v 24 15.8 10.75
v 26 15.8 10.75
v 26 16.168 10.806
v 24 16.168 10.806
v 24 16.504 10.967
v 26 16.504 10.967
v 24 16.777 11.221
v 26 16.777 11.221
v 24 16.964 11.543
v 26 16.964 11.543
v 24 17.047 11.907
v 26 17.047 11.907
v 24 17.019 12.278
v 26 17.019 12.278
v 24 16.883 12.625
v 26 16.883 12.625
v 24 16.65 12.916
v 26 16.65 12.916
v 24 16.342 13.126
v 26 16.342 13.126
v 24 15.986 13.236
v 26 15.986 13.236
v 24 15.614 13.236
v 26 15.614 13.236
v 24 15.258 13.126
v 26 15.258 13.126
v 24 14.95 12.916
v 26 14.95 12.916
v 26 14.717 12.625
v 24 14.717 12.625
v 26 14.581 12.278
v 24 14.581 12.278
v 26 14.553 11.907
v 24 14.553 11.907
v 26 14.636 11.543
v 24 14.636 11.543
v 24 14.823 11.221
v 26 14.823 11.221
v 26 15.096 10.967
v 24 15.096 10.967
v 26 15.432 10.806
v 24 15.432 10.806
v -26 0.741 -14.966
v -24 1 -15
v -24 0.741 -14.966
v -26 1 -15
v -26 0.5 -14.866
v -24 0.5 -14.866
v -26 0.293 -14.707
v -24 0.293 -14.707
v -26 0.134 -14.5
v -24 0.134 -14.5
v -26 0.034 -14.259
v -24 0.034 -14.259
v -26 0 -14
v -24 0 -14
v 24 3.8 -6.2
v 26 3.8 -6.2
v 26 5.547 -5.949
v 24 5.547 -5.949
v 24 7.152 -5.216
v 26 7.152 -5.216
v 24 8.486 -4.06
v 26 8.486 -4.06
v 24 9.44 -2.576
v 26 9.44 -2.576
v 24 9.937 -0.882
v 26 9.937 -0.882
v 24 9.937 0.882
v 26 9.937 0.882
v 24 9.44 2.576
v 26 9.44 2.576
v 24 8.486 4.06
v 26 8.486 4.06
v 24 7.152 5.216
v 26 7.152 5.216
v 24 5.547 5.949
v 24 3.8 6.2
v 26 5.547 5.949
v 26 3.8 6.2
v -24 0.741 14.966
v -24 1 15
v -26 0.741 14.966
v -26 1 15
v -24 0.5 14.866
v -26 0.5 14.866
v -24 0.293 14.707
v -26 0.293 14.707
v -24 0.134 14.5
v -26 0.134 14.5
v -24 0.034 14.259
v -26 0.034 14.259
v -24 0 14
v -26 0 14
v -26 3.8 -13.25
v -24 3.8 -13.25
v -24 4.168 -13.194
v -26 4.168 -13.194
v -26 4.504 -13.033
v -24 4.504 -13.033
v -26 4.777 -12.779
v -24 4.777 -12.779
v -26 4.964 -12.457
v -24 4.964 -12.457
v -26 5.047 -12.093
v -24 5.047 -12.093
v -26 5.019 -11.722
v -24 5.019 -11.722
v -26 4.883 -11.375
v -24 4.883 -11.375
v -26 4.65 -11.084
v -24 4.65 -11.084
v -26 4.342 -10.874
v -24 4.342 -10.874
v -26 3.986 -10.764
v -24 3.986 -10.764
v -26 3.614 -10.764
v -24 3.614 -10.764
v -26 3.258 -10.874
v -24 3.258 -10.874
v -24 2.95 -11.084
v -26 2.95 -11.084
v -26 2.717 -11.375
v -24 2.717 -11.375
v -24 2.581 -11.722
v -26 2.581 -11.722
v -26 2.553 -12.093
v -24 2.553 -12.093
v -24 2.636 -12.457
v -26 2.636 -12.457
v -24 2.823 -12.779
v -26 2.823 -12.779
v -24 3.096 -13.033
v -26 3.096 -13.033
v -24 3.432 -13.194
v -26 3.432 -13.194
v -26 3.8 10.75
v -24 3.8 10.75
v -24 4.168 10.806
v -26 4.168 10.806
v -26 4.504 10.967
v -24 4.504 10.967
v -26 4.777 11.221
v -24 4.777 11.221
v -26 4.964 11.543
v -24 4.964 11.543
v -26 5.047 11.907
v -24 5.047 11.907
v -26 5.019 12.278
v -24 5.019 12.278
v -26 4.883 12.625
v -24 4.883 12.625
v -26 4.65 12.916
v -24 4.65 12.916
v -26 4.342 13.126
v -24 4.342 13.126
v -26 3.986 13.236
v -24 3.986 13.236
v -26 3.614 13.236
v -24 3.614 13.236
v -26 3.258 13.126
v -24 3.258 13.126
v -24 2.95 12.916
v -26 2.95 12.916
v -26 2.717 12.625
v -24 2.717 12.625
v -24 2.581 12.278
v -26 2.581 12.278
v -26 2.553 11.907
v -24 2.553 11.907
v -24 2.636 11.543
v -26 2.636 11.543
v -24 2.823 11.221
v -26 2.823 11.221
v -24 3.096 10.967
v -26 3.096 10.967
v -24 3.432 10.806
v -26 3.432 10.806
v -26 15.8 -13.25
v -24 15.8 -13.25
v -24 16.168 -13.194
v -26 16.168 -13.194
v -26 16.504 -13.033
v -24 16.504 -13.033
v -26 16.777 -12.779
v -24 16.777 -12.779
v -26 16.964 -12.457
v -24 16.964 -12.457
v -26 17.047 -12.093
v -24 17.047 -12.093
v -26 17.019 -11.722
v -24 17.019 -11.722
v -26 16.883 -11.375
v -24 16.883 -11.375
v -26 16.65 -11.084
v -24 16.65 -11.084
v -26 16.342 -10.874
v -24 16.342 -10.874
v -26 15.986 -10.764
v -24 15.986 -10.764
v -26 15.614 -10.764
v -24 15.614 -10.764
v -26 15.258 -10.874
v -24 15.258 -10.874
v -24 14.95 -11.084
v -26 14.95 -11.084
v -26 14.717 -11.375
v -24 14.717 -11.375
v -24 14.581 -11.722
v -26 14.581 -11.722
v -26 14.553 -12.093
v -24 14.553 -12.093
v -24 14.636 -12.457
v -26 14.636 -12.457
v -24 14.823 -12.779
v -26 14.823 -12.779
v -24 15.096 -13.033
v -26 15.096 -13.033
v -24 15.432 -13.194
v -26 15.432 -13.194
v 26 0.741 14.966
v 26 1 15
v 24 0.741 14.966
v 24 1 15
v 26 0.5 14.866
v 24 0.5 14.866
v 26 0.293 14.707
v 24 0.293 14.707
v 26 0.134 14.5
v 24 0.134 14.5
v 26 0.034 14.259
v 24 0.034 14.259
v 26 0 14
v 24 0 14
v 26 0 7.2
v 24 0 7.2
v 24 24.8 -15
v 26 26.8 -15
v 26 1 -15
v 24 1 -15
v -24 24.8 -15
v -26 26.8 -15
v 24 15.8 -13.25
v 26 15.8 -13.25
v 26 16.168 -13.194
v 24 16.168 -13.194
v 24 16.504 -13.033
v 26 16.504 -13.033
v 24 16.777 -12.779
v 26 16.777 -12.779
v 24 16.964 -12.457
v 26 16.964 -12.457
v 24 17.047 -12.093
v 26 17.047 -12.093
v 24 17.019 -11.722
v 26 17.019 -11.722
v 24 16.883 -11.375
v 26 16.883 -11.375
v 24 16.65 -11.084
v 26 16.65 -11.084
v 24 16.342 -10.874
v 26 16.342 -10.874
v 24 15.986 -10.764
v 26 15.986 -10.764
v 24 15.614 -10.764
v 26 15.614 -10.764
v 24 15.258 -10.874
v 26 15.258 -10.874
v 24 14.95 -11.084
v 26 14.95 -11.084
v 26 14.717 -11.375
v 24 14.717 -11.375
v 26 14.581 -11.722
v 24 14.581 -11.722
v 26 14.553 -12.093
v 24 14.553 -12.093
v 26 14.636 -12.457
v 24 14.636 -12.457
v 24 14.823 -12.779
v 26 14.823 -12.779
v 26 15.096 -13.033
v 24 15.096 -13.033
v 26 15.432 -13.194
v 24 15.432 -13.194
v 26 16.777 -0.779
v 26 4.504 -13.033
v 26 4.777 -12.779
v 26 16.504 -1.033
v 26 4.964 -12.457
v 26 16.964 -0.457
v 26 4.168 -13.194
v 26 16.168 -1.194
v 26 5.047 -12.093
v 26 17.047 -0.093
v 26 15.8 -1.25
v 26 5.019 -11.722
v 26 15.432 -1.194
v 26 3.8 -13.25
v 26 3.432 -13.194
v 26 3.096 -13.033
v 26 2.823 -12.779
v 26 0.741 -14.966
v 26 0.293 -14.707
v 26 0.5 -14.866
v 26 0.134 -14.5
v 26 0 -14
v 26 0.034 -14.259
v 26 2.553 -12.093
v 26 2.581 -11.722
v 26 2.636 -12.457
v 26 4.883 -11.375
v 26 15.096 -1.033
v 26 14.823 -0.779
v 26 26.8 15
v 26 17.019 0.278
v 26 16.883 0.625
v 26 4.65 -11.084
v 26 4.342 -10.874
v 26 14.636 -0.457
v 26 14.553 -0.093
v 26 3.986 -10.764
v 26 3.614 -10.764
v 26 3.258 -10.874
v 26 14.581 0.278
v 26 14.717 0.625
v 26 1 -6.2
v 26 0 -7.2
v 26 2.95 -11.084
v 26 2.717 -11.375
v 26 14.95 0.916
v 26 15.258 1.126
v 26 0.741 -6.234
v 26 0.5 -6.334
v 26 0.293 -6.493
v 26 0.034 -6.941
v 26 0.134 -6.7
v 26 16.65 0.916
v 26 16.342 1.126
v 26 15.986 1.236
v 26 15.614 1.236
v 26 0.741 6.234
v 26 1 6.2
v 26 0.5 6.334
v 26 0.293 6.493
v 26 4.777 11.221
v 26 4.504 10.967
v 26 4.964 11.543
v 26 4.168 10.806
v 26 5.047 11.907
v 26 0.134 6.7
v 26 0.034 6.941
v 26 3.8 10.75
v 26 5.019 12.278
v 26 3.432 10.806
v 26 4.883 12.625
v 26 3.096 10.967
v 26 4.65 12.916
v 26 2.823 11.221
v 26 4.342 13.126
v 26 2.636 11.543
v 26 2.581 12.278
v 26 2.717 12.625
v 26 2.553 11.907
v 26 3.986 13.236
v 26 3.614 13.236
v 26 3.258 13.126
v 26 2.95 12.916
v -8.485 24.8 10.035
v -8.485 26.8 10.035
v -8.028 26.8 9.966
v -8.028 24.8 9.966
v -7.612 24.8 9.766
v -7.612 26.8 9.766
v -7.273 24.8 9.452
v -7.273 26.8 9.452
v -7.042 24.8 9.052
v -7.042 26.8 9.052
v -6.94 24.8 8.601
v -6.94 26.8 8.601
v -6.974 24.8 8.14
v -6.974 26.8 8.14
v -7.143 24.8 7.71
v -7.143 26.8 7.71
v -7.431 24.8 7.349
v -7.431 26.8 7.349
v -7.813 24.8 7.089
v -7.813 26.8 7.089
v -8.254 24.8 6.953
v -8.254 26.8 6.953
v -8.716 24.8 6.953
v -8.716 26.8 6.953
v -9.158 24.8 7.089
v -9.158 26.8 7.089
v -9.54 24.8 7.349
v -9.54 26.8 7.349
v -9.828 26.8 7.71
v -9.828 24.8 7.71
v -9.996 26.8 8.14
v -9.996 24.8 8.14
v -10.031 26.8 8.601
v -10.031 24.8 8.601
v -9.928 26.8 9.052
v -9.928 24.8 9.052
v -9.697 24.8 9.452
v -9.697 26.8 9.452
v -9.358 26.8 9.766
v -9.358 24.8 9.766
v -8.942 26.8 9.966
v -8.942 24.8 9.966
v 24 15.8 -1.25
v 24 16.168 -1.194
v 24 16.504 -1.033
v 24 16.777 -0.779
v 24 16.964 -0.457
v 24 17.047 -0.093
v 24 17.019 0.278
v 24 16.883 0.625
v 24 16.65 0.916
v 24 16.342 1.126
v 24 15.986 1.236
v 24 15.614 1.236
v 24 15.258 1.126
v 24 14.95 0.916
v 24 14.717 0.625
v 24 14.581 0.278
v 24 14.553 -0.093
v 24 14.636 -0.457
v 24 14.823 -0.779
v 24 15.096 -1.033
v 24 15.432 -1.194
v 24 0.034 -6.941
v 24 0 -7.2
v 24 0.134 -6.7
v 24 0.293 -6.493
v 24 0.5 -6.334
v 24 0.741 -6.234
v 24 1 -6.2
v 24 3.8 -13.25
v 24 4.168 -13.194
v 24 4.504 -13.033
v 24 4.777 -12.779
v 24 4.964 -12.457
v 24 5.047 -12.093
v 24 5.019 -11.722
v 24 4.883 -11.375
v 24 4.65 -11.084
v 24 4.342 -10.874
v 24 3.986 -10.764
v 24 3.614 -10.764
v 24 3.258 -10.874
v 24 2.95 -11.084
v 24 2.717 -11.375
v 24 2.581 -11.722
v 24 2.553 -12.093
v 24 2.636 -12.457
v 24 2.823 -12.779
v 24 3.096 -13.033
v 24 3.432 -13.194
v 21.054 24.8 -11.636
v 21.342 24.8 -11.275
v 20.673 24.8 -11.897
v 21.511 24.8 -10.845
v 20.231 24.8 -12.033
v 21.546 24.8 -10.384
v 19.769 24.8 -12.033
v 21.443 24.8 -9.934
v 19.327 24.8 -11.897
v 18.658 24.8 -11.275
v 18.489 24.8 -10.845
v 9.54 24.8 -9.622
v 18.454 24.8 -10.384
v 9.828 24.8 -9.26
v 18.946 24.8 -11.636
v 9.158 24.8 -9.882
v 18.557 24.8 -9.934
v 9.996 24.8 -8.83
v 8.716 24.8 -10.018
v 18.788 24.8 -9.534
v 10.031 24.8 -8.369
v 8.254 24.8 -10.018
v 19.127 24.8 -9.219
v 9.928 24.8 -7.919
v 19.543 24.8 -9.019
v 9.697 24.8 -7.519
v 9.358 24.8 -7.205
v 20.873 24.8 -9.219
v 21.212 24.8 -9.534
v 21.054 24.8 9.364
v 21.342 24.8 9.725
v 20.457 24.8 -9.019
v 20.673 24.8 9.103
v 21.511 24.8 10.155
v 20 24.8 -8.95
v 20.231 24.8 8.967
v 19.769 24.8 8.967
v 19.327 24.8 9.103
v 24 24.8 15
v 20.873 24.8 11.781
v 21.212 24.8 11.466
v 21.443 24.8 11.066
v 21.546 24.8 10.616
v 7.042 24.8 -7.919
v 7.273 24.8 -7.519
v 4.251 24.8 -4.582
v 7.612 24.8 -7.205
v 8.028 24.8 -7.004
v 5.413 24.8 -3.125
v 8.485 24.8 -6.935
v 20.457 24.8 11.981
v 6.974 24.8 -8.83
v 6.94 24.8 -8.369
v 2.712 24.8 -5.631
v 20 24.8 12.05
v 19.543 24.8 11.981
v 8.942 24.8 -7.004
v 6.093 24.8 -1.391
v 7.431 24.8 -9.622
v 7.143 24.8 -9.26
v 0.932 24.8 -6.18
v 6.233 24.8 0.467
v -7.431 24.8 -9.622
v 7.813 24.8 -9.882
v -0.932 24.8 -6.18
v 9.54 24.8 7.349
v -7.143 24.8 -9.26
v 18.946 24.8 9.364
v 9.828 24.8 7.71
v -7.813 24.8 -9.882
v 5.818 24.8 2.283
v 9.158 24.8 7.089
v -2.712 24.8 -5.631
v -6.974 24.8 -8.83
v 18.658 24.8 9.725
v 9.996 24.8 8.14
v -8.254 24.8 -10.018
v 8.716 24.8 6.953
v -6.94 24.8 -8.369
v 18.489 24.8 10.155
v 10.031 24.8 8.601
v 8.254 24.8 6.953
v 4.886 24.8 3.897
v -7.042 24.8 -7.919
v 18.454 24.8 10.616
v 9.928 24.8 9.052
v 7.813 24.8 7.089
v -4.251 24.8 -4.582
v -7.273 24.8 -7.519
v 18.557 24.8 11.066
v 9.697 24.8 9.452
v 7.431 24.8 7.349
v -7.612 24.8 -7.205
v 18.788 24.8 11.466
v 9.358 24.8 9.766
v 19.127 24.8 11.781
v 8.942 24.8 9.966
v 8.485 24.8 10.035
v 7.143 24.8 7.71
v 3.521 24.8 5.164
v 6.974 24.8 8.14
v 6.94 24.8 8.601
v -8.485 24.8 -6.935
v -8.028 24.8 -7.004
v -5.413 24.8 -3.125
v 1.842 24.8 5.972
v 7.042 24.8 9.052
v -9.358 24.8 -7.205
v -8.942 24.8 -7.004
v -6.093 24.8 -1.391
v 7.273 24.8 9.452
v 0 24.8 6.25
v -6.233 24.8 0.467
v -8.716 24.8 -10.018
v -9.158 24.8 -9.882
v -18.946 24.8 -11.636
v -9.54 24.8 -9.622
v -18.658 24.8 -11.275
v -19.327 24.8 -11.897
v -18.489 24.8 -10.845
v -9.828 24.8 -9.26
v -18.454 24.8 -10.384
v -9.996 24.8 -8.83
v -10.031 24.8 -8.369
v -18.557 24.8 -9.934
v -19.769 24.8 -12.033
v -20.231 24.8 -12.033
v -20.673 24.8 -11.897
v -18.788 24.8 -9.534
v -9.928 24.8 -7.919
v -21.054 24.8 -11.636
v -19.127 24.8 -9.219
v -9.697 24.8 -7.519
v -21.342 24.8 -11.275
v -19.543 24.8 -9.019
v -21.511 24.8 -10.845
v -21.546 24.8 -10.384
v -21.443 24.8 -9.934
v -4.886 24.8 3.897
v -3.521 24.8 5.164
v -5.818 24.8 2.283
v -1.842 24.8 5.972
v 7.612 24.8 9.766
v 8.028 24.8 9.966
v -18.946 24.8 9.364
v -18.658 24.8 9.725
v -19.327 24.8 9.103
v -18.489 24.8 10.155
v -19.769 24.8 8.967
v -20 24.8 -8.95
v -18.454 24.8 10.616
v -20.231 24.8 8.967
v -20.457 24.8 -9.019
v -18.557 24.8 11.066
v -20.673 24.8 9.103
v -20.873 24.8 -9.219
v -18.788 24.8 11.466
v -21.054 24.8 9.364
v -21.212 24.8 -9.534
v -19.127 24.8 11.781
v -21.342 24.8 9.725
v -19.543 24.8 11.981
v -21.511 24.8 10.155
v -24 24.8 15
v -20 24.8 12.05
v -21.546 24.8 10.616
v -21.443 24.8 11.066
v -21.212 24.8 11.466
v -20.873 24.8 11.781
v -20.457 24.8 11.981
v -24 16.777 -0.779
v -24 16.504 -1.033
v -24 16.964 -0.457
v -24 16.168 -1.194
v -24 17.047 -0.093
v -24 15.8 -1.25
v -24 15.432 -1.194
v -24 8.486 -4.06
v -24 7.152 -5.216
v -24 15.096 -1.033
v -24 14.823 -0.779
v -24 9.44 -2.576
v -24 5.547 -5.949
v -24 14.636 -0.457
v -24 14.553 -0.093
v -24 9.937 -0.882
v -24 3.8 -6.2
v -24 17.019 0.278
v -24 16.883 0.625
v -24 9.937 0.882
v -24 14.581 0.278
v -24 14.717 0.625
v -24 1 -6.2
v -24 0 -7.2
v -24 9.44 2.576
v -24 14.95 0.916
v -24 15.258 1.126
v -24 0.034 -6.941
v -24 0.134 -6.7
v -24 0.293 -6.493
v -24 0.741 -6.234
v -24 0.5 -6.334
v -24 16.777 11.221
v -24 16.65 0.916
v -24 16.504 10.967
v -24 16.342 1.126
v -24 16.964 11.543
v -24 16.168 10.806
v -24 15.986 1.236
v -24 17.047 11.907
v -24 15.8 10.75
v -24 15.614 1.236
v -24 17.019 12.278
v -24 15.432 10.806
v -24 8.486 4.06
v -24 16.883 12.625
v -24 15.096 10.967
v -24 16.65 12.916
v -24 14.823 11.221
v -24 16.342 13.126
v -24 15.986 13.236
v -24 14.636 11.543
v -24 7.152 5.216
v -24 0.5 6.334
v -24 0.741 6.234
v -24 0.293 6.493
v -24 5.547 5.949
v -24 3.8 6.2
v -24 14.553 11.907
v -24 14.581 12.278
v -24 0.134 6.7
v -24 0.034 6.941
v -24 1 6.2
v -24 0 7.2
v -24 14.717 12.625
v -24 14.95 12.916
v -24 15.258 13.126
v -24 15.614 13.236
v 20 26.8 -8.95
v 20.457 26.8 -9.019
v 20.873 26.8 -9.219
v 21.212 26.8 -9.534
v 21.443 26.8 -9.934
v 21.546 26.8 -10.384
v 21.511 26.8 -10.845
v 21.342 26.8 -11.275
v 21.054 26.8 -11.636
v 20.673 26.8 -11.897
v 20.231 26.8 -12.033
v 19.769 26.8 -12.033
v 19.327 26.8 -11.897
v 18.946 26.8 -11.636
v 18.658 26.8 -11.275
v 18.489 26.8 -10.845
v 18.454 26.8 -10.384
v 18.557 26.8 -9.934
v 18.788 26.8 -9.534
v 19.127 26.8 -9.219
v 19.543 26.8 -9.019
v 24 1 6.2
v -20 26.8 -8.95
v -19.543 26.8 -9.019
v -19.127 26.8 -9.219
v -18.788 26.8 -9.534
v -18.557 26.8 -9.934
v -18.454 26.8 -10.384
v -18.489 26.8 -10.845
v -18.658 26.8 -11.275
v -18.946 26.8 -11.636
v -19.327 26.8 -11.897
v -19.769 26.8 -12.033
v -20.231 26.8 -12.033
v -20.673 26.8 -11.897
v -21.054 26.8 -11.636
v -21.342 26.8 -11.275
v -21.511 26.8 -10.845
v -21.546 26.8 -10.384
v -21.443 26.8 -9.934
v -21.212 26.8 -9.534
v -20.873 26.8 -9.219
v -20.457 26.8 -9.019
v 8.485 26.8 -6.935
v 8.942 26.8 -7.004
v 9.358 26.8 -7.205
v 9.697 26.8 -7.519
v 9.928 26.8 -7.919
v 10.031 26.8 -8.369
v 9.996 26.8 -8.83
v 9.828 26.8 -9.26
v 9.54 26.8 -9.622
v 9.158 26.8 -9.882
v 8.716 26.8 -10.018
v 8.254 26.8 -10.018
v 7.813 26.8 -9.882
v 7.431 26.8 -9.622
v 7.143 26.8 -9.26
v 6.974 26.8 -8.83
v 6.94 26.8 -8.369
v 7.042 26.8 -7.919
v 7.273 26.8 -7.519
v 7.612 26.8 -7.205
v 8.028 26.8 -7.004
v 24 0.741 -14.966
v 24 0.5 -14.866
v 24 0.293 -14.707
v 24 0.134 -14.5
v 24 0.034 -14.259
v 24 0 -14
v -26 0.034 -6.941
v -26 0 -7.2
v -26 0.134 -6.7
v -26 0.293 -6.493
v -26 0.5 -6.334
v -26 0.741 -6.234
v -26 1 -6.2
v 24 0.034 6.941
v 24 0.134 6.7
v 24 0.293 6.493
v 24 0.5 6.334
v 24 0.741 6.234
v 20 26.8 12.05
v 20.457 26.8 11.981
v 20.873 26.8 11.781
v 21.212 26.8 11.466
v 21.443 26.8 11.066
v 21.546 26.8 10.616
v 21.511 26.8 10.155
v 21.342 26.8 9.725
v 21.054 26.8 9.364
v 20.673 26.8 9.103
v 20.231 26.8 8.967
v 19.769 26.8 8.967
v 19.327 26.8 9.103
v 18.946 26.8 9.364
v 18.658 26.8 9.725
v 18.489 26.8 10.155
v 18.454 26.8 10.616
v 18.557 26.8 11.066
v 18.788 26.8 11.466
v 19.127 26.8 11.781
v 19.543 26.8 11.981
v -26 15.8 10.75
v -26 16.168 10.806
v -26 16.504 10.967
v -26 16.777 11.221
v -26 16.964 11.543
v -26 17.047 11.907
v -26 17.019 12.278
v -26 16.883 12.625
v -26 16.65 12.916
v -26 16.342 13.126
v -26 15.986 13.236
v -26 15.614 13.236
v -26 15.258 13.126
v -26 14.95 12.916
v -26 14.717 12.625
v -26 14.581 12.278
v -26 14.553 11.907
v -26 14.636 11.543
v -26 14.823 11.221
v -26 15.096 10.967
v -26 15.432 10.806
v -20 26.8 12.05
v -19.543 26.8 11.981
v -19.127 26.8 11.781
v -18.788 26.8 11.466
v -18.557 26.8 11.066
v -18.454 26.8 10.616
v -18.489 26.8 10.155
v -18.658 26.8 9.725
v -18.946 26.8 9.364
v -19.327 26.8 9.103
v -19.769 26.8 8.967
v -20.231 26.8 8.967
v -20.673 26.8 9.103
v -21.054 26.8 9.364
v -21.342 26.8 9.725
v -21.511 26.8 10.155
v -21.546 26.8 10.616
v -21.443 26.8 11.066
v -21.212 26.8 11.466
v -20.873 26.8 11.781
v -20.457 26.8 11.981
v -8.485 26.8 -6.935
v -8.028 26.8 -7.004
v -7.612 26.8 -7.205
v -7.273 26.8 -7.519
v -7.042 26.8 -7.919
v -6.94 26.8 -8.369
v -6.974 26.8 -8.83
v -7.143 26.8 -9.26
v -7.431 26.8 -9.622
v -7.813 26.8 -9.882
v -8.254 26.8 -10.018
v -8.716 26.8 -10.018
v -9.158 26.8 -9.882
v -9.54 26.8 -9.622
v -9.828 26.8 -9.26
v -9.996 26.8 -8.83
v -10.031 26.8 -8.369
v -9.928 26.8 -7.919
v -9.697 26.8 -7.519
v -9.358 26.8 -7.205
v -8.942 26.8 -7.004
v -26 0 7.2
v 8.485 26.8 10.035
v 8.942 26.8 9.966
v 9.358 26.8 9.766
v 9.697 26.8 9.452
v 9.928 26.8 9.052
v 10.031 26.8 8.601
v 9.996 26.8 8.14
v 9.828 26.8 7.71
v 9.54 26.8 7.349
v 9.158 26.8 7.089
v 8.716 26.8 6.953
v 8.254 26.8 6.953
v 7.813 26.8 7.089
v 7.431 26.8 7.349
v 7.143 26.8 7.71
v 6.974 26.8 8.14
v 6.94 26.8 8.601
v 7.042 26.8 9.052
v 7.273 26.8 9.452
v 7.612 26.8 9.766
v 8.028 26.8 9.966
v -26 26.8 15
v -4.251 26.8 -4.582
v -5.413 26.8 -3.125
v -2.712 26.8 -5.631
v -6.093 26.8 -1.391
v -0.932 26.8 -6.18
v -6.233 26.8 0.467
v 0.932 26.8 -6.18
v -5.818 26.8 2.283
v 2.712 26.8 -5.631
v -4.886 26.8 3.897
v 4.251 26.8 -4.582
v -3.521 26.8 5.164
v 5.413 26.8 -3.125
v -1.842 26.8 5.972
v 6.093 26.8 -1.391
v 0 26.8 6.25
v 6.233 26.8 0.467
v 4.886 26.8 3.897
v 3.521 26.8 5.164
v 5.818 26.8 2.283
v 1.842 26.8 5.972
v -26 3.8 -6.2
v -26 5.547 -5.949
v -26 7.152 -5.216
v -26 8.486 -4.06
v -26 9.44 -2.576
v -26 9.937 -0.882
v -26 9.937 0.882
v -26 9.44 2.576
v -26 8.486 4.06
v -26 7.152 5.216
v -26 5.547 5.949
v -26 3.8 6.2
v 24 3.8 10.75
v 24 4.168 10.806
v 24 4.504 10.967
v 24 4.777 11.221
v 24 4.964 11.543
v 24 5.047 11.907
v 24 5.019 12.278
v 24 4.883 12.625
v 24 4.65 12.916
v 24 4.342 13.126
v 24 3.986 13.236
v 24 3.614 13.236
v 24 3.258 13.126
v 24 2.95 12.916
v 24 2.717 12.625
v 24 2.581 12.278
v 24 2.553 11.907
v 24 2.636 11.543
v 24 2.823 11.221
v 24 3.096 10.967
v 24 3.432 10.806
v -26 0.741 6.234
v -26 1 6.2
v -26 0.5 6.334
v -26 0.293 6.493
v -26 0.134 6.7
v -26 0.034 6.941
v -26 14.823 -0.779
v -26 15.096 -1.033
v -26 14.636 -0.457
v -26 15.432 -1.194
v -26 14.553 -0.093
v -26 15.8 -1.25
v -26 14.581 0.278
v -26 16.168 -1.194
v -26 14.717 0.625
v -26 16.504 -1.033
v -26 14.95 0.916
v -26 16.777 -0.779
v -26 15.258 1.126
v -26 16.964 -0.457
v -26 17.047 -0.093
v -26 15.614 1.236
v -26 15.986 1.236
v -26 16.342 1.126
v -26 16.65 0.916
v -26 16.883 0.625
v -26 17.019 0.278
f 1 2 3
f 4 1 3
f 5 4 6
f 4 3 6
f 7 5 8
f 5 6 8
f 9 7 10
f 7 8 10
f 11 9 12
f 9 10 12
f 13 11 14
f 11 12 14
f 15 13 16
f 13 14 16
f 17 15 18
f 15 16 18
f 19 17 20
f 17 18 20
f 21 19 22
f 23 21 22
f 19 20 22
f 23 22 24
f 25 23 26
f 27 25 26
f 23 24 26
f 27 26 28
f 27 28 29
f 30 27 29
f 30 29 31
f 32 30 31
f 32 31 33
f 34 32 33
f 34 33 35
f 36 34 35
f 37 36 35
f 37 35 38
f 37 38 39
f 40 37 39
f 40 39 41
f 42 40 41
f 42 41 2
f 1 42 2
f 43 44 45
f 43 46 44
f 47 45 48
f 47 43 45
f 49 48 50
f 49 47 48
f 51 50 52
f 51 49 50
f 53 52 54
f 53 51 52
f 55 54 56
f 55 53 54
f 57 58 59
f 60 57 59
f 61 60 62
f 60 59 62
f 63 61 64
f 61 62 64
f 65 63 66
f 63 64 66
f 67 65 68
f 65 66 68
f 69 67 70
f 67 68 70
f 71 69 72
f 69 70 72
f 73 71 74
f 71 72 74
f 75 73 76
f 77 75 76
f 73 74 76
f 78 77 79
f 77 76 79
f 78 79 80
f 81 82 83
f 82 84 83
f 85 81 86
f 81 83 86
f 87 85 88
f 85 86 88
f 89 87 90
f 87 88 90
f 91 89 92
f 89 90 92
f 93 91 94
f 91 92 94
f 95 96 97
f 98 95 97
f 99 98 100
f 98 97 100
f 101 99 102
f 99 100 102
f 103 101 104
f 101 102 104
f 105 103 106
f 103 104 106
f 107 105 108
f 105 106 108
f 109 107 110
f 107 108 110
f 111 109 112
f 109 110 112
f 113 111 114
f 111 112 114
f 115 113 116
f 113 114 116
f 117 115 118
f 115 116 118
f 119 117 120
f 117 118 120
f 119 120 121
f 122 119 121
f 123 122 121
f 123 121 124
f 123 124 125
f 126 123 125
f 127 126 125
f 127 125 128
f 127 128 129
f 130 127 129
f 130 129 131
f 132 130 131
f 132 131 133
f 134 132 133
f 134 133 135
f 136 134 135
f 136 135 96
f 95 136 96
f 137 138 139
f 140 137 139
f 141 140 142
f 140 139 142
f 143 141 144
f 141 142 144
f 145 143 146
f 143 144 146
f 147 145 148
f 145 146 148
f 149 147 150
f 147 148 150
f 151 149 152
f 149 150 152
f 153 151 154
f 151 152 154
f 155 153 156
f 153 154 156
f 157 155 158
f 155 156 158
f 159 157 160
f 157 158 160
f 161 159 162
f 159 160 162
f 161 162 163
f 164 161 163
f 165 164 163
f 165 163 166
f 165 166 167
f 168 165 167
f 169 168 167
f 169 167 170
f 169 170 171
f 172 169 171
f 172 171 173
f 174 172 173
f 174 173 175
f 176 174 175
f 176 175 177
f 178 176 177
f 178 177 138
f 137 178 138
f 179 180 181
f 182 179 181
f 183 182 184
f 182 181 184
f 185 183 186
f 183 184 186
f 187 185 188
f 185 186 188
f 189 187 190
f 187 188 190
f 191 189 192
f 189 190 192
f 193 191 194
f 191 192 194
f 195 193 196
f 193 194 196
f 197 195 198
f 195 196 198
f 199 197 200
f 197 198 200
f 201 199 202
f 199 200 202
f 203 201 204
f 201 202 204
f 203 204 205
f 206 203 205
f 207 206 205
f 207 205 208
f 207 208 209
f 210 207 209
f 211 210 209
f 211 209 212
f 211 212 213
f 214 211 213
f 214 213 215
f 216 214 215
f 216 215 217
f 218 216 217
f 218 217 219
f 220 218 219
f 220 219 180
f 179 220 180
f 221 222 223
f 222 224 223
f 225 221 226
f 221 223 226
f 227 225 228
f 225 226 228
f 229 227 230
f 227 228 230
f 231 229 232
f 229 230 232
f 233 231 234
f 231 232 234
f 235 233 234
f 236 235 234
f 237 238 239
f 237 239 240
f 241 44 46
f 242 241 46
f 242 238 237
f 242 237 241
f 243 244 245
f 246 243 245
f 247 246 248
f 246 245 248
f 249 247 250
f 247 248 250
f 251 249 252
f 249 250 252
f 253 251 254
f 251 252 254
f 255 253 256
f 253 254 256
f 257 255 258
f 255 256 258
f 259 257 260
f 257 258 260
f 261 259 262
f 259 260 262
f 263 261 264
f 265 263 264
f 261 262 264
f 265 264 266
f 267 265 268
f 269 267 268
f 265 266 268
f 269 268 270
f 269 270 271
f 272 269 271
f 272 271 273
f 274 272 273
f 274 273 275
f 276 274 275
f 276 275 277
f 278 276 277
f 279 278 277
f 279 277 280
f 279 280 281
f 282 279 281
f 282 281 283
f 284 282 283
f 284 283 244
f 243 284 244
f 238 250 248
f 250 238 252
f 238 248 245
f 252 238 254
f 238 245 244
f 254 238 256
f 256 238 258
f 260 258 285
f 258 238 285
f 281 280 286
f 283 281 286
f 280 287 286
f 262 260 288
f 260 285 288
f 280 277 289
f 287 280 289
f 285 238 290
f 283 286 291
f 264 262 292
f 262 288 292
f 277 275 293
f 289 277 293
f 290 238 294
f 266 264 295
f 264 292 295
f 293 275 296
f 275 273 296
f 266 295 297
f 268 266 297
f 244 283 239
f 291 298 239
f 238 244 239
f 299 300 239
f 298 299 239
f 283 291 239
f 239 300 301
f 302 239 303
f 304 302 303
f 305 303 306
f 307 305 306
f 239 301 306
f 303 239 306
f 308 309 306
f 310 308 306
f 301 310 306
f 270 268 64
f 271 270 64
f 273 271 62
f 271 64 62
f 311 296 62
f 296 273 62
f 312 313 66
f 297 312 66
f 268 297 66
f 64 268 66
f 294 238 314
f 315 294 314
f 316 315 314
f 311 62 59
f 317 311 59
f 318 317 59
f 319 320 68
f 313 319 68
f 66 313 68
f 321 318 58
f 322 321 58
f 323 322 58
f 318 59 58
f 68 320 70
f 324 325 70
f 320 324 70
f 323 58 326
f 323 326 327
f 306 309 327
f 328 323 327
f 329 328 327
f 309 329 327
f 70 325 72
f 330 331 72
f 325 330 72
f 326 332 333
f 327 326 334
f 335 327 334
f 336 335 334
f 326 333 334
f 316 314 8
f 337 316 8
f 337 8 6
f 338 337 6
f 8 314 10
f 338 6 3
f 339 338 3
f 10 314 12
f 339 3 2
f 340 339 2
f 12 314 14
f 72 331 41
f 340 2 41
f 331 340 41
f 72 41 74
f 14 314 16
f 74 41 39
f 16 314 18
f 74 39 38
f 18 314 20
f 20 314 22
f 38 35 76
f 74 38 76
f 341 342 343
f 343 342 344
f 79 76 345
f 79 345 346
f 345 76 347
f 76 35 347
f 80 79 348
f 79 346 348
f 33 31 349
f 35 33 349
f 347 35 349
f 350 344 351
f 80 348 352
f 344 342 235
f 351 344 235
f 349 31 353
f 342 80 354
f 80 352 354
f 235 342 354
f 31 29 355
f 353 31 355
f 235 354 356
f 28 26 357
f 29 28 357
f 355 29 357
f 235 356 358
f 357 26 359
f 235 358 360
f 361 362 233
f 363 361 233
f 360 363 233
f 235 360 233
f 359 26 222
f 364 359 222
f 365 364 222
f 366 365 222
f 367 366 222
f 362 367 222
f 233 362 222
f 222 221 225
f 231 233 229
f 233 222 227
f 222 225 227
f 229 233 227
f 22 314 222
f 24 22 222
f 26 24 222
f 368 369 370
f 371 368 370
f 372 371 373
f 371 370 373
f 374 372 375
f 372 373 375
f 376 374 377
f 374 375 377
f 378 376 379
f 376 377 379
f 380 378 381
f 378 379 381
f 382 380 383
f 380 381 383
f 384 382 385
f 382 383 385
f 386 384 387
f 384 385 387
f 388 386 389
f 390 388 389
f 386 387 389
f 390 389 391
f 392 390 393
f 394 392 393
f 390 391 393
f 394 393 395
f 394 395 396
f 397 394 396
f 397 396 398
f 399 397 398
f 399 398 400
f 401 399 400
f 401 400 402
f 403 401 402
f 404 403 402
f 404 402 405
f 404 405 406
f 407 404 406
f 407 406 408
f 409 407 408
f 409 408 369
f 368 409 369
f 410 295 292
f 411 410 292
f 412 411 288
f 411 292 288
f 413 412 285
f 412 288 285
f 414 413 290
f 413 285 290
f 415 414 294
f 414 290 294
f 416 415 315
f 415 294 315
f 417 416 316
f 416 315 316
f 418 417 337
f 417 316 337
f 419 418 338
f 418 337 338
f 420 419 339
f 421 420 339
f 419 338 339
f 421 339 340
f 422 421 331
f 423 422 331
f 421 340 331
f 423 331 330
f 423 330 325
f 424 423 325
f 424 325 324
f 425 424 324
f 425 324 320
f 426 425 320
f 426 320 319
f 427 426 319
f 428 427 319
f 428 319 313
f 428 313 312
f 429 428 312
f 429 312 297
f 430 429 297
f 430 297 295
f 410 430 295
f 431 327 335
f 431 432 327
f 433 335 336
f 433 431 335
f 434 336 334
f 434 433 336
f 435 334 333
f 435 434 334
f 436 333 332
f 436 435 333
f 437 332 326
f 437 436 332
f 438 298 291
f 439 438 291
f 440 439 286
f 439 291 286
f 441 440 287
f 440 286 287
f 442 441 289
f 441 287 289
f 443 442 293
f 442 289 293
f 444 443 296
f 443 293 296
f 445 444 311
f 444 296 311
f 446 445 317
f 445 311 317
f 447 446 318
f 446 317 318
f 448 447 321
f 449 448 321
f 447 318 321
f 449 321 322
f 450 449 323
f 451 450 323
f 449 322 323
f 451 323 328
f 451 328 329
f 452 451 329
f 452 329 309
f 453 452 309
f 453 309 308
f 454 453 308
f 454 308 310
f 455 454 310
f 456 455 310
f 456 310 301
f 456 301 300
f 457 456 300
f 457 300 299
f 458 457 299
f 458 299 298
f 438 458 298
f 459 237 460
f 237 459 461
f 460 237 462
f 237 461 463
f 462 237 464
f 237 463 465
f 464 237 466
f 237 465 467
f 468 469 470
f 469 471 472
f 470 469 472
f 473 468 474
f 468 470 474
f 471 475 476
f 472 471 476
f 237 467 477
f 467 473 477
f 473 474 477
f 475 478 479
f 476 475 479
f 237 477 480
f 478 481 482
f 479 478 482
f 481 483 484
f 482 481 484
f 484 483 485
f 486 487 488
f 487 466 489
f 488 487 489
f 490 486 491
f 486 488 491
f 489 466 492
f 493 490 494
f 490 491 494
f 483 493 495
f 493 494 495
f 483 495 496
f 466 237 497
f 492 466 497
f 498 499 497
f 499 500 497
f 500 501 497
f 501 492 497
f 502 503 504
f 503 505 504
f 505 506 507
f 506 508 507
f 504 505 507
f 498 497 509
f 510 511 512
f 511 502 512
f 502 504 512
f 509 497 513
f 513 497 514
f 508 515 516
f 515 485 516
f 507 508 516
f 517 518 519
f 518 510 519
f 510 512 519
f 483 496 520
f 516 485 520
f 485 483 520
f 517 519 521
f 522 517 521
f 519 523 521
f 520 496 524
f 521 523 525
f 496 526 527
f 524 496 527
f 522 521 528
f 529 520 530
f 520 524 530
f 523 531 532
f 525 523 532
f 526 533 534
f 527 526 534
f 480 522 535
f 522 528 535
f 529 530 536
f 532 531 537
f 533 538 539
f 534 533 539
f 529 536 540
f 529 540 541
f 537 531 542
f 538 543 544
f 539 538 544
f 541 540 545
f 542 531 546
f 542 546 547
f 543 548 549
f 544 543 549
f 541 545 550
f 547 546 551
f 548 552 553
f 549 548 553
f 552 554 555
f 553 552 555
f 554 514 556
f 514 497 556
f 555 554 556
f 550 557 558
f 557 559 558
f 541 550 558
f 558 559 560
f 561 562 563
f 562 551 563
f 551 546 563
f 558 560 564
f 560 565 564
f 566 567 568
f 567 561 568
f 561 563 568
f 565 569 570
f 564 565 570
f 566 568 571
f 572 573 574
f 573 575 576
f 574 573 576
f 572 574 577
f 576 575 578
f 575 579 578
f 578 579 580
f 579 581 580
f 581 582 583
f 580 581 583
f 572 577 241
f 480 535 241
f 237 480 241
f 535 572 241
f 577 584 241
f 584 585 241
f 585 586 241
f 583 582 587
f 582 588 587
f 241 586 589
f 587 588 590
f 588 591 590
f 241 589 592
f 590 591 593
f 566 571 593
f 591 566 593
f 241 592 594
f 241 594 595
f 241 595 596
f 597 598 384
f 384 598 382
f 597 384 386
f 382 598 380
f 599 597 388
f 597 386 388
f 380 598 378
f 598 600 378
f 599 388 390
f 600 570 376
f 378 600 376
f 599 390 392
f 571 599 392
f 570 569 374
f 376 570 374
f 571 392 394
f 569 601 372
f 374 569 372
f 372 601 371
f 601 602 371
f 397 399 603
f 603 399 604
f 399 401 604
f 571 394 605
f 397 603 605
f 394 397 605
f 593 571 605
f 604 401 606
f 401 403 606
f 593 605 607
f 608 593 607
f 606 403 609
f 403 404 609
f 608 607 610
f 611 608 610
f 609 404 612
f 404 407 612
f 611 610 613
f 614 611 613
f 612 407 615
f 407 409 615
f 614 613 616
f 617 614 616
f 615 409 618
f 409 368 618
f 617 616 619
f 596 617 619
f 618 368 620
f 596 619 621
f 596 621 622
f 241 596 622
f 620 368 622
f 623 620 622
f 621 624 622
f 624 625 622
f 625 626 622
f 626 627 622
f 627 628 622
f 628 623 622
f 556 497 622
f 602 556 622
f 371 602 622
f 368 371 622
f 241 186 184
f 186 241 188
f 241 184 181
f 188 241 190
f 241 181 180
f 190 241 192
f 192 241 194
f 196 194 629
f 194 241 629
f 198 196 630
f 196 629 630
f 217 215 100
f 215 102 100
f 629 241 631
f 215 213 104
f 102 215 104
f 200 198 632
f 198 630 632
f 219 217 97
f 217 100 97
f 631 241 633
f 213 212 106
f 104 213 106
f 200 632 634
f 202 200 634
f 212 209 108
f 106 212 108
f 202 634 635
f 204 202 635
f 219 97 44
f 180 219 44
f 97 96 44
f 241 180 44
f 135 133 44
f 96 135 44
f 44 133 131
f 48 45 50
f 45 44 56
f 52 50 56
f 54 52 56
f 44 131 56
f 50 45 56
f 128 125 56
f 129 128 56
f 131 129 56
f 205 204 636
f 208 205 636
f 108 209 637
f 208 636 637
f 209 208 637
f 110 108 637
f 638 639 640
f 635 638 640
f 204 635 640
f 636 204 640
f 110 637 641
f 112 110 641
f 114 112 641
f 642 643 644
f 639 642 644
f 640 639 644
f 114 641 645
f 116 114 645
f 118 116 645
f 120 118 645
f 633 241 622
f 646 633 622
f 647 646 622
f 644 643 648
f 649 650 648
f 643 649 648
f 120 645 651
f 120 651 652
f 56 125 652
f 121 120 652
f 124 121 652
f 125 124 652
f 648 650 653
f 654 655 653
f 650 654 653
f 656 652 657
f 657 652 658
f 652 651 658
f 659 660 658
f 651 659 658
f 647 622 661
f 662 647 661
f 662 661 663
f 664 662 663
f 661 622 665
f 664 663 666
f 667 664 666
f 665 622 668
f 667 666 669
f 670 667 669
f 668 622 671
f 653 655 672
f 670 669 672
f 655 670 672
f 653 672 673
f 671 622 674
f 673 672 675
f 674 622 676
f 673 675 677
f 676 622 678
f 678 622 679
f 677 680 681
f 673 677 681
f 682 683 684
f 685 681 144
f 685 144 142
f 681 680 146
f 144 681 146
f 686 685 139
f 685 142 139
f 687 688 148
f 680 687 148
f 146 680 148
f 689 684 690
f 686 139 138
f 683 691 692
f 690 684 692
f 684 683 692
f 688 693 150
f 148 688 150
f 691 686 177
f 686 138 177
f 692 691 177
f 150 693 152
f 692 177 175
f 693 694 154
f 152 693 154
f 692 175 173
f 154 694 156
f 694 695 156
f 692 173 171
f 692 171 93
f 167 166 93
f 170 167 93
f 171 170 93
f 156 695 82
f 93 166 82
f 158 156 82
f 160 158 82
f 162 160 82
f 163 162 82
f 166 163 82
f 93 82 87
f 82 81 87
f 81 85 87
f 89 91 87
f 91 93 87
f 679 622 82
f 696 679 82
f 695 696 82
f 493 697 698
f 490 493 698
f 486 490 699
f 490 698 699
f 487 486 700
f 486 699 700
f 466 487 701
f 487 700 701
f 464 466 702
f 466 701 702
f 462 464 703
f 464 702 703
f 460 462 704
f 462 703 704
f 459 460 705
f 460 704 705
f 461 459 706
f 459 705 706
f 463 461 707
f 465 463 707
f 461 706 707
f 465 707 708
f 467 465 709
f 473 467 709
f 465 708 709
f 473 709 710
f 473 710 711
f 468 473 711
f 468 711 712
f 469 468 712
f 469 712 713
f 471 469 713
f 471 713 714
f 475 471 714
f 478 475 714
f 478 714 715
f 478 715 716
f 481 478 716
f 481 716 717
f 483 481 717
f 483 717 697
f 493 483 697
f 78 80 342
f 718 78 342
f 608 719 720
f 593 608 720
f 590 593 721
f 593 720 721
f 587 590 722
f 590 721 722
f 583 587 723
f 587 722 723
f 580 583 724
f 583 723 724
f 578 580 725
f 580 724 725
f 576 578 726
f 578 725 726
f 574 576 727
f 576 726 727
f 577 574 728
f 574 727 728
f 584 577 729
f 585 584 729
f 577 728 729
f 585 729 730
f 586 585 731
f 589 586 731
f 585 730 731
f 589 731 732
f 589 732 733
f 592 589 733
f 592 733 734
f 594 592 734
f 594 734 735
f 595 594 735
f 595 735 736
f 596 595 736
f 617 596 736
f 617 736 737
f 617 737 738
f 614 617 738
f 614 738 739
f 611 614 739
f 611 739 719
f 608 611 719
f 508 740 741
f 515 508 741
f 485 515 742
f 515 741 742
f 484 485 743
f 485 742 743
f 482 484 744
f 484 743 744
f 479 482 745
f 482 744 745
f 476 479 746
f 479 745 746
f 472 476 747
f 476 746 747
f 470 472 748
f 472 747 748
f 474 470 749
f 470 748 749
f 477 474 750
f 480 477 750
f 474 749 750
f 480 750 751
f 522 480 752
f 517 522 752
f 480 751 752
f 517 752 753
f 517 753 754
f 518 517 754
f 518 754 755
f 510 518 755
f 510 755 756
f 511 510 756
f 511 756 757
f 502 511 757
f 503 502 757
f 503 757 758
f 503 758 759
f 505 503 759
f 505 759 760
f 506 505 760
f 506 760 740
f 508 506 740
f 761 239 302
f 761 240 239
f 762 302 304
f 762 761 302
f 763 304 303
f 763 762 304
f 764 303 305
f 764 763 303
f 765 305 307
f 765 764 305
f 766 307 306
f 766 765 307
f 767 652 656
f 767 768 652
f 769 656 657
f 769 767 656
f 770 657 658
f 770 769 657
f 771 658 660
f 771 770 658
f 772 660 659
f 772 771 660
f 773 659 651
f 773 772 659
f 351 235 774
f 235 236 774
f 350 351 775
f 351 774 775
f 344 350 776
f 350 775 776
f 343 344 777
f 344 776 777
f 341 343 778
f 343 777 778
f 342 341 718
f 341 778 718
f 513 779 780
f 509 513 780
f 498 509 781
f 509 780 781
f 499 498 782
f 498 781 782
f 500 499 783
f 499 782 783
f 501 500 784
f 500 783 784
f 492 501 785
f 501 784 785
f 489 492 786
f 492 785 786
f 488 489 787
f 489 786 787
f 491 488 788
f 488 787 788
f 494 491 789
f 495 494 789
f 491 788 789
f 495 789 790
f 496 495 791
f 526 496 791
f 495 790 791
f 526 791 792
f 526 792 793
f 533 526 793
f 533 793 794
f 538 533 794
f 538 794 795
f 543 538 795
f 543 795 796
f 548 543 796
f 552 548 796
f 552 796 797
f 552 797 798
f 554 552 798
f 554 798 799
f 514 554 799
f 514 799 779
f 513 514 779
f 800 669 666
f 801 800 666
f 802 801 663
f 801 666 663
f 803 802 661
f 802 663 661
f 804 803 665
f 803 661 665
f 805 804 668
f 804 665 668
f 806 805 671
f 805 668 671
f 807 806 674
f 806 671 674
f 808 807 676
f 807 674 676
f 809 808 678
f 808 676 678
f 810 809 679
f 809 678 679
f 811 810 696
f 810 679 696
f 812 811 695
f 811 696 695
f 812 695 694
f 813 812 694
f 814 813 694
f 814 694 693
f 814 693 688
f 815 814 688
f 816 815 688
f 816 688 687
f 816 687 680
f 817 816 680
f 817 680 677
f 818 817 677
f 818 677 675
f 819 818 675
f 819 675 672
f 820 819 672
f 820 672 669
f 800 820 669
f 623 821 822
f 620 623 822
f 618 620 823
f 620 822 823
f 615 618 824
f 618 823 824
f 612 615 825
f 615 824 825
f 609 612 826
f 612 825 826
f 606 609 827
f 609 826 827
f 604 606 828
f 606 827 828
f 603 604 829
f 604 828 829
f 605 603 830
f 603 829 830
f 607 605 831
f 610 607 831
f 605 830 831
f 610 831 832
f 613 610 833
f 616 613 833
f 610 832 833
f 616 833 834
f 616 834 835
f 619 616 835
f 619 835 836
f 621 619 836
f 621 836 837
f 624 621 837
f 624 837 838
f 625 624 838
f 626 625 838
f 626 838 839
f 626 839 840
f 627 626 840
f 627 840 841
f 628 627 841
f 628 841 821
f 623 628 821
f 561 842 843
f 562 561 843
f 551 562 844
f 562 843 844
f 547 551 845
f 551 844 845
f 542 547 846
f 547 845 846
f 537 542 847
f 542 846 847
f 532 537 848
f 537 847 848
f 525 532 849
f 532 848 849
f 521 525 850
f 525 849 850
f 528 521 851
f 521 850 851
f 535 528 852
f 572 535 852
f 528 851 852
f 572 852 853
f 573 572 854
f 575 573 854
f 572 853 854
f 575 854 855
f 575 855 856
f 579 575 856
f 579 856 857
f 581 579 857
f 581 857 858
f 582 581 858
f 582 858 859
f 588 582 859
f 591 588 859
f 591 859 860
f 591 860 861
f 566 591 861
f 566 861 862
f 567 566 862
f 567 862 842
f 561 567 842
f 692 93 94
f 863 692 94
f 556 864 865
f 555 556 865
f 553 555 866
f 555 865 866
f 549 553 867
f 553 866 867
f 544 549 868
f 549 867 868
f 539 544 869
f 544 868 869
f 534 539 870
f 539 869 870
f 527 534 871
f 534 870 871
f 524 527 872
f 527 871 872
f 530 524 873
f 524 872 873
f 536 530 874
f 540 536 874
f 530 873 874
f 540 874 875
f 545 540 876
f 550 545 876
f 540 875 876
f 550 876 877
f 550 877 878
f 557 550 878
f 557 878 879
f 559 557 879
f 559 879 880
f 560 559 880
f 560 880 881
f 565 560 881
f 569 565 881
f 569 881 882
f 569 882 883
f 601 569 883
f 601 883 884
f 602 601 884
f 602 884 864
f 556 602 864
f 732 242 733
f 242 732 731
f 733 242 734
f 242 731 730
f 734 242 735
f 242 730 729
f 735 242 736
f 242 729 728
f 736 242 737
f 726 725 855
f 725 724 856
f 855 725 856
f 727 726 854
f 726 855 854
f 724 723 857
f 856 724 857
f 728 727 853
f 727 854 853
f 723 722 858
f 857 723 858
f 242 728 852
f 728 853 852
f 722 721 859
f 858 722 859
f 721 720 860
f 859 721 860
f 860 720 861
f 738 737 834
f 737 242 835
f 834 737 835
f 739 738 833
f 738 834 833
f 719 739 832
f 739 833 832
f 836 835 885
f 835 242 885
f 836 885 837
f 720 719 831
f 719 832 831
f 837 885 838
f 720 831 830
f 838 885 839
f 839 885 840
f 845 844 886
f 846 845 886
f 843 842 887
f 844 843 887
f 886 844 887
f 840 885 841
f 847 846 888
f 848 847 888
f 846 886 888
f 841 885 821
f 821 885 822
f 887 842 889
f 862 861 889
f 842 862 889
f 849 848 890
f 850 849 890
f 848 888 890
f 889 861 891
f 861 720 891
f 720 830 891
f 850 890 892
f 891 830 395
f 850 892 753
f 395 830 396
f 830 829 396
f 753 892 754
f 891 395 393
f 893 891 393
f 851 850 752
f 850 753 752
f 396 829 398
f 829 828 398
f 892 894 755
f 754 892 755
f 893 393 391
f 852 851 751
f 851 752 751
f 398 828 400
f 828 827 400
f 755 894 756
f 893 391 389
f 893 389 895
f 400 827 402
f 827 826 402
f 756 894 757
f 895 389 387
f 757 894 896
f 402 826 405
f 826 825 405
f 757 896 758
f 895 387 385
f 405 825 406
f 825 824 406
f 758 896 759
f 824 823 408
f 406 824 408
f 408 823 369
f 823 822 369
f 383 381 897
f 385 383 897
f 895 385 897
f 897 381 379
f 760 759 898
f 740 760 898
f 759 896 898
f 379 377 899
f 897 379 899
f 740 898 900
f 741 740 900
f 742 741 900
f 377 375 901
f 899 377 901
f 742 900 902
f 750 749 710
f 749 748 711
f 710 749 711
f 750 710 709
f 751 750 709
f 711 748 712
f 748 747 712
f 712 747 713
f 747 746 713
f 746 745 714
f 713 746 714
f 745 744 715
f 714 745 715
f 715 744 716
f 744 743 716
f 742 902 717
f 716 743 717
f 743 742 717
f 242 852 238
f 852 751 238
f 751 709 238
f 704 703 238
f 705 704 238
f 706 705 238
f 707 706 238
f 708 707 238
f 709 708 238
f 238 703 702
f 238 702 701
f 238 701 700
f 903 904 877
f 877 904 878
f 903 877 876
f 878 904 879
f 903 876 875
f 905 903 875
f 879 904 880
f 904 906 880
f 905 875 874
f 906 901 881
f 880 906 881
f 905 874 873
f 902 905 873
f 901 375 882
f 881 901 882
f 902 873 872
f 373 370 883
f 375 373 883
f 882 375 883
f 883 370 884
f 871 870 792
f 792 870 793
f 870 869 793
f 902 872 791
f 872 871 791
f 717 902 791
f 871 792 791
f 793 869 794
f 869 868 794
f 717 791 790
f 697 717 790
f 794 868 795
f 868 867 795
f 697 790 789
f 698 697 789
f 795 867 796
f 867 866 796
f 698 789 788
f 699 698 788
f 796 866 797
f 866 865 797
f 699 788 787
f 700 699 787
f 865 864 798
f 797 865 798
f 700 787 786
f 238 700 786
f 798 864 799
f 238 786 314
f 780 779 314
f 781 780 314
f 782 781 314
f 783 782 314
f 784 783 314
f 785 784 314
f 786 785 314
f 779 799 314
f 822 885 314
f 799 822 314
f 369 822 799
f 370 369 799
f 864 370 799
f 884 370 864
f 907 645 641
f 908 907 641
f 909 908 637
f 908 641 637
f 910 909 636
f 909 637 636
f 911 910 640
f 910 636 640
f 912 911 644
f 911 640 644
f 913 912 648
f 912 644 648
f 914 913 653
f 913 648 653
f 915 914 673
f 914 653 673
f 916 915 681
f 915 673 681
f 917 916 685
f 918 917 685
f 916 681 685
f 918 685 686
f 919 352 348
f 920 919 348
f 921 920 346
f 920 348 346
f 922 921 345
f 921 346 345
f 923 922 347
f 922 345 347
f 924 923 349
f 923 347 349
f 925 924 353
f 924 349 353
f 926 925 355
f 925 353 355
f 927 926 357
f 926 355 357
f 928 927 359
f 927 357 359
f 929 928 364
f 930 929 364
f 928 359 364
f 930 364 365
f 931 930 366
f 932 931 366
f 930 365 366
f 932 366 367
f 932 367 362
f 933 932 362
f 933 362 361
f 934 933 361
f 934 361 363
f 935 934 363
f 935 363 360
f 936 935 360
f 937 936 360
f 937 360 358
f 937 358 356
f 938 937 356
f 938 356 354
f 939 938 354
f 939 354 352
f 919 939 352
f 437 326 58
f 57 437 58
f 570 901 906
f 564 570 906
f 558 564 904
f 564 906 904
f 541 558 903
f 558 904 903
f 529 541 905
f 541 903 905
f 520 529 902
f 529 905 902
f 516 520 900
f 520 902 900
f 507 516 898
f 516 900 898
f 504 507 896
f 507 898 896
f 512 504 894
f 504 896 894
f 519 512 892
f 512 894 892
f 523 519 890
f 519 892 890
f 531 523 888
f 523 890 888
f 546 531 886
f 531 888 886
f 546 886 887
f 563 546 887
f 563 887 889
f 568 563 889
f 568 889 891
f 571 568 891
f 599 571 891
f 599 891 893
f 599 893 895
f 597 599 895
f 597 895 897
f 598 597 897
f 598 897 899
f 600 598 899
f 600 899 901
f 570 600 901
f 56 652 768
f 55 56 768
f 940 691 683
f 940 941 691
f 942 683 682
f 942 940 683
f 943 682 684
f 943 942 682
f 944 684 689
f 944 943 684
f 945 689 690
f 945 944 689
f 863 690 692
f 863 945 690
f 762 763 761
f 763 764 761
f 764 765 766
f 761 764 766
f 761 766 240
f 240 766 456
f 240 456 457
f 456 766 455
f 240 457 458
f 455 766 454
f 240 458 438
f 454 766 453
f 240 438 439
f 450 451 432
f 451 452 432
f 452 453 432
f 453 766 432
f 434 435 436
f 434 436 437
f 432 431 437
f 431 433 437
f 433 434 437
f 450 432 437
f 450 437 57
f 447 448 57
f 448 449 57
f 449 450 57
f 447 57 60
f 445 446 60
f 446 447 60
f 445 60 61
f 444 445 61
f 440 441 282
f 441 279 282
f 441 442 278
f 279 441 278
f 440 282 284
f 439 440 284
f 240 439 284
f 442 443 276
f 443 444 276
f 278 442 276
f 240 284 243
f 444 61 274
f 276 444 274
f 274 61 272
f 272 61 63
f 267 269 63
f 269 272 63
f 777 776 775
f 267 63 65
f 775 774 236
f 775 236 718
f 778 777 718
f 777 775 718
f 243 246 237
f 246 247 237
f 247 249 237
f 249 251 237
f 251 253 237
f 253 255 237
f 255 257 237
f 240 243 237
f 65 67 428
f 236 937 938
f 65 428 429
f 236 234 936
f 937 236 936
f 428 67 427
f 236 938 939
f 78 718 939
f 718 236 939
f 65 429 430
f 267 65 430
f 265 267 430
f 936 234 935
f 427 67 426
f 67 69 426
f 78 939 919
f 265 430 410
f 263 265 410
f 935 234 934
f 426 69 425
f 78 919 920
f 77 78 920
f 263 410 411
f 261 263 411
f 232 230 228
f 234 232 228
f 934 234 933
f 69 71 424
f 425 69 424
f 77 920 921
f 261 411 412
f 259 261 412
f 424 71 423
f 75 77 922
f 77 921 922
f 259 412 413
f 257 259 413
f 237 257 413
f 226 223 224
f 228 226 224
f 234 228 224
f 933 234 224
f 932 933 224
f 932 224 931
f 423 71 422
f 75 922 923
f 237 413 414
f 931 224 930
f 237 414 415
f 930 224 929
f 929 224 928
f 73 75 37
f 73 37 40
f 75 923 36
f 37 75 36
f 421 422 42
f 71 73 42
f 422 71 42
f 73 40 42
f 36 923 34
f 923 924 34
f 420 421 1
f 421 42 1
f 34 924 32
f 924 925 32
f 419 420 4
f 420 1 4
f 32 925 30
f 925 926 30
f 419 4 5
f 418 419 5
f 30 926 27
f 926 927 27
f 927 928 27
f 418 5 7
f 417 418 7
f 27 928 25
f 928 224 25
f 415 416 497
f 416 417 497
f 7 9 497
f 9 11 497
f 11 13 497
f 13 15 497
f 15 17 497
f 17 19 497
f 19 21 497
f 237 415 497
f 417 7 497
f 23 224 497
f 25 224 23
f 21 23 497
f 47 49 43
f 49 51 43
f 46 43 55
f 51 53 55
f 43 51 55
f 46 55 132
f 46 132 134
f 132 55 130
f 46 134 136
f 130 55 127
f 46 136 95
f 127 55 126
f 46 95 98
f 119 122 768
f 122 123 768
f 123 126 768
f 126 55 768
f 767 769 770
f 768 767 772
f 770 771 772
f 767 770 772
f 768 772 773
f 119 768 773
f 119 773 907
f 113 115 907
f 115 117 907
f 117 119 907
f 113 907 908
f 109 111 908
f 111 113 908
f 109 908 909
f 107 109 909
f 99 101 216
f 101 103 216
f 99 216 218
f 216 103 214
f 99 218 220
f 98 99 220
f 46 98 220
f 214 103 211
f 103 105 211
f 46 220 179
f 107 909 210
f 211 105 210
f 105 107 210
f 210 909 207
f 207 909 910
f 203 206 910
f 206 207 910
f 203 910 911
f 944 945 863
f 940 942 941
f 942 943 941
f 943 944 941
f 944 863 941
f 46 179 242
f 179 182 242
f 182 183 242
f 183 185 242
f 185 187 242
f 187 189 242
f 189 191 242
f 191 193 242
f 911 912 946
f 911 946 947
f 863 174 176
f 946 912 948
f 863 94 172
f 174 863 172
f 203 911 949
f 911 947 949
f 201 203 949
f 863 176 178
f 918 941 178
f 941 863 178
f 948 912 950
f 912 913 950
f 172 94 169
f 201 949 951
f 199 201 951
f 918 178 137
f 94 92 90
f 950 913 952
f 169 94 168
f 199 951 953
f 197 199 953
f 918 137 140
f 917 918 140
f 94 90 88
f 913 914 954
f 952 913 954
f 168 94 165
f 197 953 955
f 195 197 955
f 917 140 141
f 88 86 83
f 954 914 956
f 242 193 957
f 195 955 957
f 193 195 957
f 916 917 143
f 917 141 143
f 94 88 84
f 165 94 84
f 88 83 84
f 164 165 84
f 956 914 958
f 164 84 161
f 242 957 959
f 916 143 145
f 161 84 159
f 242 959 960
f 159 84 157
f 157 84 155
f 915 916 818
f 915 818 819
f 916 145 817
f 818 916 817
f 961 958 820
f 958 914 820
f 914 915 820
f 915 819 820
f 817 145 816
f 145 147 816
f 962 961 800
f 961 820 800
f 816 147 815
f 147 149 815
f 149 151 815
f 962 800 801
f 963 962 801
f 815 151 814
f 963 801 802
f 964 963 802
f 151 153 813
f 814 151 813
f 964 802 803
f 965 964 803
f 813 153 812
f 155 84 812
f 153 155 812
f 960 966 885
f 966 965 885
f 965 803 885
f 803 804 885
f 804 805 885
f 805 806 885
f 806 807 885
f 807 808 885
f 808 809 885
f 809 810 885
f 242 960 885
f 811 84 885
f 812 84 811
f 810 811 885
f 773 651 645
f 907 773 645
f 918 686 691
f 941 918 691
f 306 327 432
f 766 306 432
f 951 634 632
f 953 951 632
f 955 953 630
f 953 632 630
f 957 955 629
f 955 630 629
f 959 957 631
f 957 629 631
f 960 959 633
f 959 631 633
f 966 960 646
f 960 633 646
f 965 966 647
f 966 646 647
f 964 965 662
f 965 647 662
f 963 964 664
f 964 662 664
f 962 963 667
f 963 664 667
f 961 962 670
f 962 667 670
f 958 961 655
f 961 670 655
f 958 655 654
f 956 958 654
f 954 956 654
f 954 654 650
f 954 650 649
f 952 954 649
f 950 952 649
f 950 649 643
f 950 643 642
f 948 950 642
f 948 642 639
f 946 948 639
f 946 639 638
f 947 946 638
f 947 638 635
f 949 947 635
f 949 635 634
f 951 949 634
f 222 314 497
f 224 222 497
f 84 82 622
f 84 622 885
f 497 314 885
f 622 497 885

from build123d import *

# Parameters (mm, degrees)
BOSS_EXTRU_1_DEPTH      = 15
ESQUISSE4_R             = 6.25
ESQUISSE4_R_2           = 1.55
ENL_V_MAT_EXTRU_2_DEPTH = 41.239781312
ESQUISSE2_R             = 1.25
ENL_V_MAT_EXTRU_1_DEPTH = 61.392383626
CONG_1_R                = 1


with BuildPart() as part:
    # Esquisse1 → Boss.-Extru.1 (new, symmetric)
    with BuildSketch(Plane.XY):
        Polygon((-26, 26.8), (26, 26.8), (26, 0), (24, 0), (24, 24.8), (-24, 24.8), (-24, 0), (-26, 0), align=None)
    extrude(amount=BOSS_EXTRU_1_DEPTH, both=True)

    # Esquisse4 → Enlèv. mat.-Extru.2 (cut, through all)
    with BuildSketch(Plane(origin=(0, 26.8, 0), x_dir=(1, 0, 0), z_dir=(0, 1, 0))):
        with Locations(Location((0, 0, 0), (0, 0, 270))):
            Circle(ESQUISSE4_R)
        with Locations(Location((-8.485281374, 8.485281374, 0), (0, 0, 270))):
            Circle(ESQUISSE4_R_2)
        with Locations(Location((8.485281374, 8.485281374, 0), (0, 0, 270))):
            Circle(ESQUISSE4_R_2)
        with Locations(Location((8.485281374, -8.485281374, 0), (0, 0, 270))):
            Circle(ESQUISSE4_R_2)
        with Locations(Location((-8.485281374, -8.485281374, 0), (0, 0, 270))):
            Circle(ESQUISSE4_R_2)
        with Locations(Location((20, 10.5, 0), (0, 0, 270))):
            Circle(ESQUISSE4_R_2)
        with Locations(Location((-20, 10.5, 0), (0, 0, 270))):
            Circle(ESQUISSE4_R_2)
        with Locations(Location((20, -10.5, 0), (0, 0, 270))):
            Circle(ESQUISSE4_R_2)
        with Locations(Location((-20, -10.5, 0), (0, 0, 270))):
            Circle(ESQUISSE4_R_2)
    extrude(amount=-ENL_V_MAT_EXTRU_2_DEPTH, mode=Mode.SUBTRACT)

    # Esquisse2 → Enlèv. mat.-Extru.1 (cut, through all)
    with BuildSketch(Plane(origin=(26, 0, 0), x_dir=(0, 0, -1), z_dir=(1, 0, 0))):
        with Locations((-12, 15.8)):
            Circle(ESQUISSE2_R)
        with Locations((-12, 3.8)):
            Circle(ESQUISSE2_R)
        with Locations((0, 15.8)):
            Circle(ESQUISSE2_R)
        with Locations((12, 3.8)):
            Circle(ESQUISSE2_R)
        with Locations((12, 15.8)):
            Circle(ESQUISSE2_R)
        with BuildLine():
            Line((-6.2, 3.8), (-6.2, 0))
            Line((-6.2, 0), (6.2, 0))
            Line((6.2, 0), (6.2, 3.8))
            ThreePointArc((6.2, 3.8), (0, 10), (-6.2, 3.8))
        make_face()
    extrude(amount=-ENL_V_MAT_EXTRU_1_DEPTH, mode=Mode.SUBTRACT)

    # Congé1
    cong_1_edges = [part.edges().sort_by_distance(p)[0] for p in [
        (-25, 0, -6.2),
        (25, 0, -6.2),
        (-25, 0, 6.2),
        (25, 0, 6.2),
        (25, 0, 15),
        (-25, 0, 15),
        (-25, 0, -15),
        (25, 0, -15),
    ]]
    fillet(cong_1_edges, radius=CONG_1_R)


solid = part.part
